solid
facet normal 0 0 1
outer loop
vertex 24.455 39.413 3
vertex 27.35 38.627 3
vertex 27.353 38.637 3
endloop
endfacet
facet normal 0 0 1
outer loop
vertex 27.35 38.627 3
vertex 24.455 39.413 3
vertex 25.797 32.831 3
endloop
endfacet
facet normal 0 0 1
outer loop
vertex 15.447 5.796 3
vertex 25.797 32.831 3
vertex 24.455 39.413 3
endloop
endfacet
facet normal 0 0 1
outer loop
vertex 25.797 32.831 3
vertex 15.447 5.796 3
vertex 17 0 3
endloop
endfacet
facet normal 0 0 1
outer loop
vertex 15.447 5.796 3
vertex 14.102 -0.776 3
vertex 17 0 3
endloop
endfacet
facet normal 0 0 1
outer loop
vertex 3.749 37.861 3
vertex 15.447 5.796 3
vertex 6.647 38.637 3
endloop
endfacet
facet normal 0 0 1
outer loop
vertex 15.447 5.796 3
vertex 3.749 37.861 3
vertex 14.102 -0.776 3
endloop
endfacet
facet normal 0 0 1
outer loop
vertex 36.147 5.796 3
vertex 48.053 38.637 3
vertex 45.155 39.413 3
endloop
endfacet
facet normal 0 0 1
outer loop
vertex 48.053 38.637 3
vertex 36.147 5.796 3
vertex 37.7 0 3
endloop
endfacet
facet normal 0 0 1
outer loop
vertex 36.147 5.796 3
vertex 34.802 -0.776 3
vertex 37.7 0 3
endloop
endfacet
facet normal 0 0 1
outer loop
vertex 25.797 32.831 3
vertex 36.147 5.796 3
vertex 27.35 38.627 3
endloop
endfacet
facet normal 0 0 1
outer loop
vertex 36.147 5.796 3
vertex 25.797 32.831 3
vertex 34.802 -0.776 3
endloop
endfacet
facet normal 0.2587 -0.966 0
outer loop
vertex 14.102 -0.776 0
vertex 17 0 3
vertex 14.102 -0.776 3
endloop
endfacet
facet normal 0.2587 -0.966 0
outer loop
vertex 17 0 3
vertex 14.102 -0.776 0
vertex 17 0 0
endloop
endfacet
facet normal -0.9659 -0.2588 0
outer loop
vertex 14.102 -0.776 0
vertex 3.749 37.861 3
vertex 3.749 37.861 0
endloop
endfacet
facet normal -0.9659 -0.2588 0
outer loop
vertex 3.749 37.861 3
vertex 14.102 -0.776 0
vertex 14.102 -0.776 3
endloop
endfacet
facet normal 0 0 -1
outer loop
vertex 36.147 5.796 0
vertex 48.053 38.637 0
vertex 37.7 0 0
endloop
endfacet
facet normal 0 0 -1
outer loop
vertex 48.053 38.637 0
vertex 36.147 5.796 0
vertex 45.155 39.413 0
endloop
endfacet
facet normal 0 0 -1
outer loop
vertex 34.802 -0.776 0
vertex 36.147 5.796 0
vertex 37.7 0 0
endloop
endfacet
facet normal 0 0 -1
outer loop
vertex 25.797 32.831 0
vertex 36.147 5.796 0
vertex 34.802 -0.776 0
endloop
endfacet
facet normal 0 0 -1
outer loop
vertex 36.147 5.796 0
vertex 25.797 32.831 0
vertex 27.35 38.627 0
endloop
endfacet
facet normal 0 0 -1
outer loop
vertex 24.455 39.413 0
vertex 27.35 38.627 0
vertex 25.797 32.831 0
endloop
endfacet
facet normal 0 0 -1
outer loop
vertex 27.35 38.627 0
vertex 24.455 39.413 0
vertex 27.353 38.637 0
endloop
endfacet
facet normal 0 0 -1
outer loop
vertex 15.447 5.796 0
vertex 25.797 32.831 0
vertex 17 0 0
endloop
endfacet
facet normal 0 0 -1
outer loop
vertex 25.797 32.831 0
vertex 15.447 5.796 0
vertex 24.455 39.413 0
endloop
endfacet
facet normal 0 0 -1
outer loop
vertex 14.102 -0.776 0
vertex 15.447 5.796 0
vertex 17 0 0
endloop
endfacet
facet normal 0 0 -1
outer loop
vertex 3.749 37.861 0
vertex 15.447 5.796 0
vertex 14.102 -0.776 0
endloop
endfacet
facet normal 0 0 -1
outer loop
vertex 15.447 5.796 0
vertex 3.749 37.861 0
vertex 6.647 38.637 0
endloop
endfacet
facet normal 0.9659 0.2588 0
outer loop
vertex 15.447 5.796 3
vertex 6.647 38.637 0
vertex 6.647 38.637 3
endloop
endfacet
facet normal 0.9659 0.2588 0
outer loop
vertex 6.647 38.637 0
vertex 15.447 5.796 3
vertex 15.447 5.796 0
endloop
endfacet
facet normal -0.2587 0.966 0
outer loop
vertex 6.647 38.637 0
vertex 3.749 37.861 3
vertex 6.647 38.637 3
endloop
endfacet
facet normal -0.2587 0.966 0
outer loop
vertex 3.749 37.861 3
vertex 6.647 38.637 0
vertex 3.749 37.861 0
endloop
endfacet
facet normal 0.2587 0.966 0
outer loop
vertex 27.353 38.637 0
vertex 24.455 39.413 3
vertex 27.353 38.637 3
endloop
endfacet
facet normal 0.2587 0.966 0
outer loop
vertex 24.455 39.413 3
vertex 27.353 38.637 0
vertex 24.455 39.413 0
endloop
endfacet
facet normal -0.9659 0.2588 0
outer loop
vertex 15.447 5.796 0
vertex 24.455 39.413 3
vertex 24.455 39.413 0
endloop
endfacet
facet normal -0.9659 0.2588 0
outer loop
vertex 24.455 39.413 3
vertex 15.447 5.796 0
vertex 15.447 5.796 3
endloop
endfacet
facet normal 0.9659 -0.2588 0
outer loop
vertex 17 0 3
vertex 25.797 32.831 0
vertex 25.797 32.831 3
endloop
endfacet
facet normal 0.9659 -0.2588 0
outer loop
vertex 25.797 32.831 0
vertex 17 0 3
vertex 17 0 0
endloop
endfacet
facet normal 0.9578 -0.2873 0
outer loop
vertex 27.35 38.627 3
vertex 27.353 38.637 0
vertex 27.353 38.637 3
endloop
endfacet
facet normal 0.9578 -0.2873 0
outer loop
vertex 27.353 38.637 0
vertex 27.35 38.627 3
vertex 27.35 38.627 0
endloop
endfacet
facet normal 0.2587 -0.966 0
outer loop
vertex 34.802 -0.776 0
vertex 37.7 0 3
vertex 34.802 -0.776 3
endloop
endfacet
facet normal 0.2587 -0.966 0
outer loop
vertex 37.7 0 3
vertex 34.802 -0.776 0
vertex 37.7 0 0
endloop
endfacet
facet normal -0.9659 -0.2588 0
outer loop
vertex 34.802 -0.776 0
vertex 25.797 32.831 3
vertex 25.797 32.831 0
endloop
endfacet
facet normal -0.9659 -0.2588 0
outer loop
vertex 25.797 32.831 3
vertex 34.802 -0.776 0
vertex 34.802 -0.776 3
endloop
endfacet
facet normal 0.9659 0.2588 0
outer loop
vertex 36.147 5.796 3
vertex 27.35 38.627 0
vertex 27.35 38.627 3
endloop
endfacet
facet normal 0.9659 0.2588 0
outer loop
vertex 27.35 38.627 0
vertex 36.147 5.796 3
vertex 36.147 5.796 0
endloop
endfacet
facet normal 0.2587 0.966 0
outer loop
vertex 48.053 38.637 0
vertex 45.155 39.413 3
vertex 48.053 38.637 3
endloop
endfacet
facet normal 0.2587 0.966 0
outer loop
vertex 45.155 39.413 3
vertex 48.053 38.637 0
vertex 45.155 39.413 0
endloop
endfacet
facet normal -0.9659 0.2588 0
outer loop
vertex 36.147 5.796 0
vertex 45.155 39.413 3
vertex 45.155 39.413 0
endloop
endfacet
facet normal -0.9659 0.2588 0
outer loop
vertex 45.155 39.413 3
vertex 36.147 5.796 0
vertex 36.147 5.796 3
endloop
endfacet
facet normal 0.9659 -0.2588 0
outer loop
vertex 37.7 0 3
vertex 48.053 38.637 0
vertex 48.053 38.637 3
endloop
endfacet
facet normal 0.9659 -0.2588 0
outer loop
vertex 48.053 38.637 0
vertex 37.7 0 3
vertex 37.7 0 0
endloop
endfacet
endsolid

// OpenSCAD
//w
translate([0,0,0])
  rotate([0,0,90])
union(){
  translate([0,-17,0]) rotate([0,0,15]) cube([40,3,3]);
  translate([0,-17,0]) rotate([0,0,-15]) cube([40,3,3]);

 translate([0,-37.7,0]) rotate([0,0,15]) cube([40,3,3]);

 translate([0,-37.7,0])
  rotate([0,0,-15]) cube([40,3,3]);
}
